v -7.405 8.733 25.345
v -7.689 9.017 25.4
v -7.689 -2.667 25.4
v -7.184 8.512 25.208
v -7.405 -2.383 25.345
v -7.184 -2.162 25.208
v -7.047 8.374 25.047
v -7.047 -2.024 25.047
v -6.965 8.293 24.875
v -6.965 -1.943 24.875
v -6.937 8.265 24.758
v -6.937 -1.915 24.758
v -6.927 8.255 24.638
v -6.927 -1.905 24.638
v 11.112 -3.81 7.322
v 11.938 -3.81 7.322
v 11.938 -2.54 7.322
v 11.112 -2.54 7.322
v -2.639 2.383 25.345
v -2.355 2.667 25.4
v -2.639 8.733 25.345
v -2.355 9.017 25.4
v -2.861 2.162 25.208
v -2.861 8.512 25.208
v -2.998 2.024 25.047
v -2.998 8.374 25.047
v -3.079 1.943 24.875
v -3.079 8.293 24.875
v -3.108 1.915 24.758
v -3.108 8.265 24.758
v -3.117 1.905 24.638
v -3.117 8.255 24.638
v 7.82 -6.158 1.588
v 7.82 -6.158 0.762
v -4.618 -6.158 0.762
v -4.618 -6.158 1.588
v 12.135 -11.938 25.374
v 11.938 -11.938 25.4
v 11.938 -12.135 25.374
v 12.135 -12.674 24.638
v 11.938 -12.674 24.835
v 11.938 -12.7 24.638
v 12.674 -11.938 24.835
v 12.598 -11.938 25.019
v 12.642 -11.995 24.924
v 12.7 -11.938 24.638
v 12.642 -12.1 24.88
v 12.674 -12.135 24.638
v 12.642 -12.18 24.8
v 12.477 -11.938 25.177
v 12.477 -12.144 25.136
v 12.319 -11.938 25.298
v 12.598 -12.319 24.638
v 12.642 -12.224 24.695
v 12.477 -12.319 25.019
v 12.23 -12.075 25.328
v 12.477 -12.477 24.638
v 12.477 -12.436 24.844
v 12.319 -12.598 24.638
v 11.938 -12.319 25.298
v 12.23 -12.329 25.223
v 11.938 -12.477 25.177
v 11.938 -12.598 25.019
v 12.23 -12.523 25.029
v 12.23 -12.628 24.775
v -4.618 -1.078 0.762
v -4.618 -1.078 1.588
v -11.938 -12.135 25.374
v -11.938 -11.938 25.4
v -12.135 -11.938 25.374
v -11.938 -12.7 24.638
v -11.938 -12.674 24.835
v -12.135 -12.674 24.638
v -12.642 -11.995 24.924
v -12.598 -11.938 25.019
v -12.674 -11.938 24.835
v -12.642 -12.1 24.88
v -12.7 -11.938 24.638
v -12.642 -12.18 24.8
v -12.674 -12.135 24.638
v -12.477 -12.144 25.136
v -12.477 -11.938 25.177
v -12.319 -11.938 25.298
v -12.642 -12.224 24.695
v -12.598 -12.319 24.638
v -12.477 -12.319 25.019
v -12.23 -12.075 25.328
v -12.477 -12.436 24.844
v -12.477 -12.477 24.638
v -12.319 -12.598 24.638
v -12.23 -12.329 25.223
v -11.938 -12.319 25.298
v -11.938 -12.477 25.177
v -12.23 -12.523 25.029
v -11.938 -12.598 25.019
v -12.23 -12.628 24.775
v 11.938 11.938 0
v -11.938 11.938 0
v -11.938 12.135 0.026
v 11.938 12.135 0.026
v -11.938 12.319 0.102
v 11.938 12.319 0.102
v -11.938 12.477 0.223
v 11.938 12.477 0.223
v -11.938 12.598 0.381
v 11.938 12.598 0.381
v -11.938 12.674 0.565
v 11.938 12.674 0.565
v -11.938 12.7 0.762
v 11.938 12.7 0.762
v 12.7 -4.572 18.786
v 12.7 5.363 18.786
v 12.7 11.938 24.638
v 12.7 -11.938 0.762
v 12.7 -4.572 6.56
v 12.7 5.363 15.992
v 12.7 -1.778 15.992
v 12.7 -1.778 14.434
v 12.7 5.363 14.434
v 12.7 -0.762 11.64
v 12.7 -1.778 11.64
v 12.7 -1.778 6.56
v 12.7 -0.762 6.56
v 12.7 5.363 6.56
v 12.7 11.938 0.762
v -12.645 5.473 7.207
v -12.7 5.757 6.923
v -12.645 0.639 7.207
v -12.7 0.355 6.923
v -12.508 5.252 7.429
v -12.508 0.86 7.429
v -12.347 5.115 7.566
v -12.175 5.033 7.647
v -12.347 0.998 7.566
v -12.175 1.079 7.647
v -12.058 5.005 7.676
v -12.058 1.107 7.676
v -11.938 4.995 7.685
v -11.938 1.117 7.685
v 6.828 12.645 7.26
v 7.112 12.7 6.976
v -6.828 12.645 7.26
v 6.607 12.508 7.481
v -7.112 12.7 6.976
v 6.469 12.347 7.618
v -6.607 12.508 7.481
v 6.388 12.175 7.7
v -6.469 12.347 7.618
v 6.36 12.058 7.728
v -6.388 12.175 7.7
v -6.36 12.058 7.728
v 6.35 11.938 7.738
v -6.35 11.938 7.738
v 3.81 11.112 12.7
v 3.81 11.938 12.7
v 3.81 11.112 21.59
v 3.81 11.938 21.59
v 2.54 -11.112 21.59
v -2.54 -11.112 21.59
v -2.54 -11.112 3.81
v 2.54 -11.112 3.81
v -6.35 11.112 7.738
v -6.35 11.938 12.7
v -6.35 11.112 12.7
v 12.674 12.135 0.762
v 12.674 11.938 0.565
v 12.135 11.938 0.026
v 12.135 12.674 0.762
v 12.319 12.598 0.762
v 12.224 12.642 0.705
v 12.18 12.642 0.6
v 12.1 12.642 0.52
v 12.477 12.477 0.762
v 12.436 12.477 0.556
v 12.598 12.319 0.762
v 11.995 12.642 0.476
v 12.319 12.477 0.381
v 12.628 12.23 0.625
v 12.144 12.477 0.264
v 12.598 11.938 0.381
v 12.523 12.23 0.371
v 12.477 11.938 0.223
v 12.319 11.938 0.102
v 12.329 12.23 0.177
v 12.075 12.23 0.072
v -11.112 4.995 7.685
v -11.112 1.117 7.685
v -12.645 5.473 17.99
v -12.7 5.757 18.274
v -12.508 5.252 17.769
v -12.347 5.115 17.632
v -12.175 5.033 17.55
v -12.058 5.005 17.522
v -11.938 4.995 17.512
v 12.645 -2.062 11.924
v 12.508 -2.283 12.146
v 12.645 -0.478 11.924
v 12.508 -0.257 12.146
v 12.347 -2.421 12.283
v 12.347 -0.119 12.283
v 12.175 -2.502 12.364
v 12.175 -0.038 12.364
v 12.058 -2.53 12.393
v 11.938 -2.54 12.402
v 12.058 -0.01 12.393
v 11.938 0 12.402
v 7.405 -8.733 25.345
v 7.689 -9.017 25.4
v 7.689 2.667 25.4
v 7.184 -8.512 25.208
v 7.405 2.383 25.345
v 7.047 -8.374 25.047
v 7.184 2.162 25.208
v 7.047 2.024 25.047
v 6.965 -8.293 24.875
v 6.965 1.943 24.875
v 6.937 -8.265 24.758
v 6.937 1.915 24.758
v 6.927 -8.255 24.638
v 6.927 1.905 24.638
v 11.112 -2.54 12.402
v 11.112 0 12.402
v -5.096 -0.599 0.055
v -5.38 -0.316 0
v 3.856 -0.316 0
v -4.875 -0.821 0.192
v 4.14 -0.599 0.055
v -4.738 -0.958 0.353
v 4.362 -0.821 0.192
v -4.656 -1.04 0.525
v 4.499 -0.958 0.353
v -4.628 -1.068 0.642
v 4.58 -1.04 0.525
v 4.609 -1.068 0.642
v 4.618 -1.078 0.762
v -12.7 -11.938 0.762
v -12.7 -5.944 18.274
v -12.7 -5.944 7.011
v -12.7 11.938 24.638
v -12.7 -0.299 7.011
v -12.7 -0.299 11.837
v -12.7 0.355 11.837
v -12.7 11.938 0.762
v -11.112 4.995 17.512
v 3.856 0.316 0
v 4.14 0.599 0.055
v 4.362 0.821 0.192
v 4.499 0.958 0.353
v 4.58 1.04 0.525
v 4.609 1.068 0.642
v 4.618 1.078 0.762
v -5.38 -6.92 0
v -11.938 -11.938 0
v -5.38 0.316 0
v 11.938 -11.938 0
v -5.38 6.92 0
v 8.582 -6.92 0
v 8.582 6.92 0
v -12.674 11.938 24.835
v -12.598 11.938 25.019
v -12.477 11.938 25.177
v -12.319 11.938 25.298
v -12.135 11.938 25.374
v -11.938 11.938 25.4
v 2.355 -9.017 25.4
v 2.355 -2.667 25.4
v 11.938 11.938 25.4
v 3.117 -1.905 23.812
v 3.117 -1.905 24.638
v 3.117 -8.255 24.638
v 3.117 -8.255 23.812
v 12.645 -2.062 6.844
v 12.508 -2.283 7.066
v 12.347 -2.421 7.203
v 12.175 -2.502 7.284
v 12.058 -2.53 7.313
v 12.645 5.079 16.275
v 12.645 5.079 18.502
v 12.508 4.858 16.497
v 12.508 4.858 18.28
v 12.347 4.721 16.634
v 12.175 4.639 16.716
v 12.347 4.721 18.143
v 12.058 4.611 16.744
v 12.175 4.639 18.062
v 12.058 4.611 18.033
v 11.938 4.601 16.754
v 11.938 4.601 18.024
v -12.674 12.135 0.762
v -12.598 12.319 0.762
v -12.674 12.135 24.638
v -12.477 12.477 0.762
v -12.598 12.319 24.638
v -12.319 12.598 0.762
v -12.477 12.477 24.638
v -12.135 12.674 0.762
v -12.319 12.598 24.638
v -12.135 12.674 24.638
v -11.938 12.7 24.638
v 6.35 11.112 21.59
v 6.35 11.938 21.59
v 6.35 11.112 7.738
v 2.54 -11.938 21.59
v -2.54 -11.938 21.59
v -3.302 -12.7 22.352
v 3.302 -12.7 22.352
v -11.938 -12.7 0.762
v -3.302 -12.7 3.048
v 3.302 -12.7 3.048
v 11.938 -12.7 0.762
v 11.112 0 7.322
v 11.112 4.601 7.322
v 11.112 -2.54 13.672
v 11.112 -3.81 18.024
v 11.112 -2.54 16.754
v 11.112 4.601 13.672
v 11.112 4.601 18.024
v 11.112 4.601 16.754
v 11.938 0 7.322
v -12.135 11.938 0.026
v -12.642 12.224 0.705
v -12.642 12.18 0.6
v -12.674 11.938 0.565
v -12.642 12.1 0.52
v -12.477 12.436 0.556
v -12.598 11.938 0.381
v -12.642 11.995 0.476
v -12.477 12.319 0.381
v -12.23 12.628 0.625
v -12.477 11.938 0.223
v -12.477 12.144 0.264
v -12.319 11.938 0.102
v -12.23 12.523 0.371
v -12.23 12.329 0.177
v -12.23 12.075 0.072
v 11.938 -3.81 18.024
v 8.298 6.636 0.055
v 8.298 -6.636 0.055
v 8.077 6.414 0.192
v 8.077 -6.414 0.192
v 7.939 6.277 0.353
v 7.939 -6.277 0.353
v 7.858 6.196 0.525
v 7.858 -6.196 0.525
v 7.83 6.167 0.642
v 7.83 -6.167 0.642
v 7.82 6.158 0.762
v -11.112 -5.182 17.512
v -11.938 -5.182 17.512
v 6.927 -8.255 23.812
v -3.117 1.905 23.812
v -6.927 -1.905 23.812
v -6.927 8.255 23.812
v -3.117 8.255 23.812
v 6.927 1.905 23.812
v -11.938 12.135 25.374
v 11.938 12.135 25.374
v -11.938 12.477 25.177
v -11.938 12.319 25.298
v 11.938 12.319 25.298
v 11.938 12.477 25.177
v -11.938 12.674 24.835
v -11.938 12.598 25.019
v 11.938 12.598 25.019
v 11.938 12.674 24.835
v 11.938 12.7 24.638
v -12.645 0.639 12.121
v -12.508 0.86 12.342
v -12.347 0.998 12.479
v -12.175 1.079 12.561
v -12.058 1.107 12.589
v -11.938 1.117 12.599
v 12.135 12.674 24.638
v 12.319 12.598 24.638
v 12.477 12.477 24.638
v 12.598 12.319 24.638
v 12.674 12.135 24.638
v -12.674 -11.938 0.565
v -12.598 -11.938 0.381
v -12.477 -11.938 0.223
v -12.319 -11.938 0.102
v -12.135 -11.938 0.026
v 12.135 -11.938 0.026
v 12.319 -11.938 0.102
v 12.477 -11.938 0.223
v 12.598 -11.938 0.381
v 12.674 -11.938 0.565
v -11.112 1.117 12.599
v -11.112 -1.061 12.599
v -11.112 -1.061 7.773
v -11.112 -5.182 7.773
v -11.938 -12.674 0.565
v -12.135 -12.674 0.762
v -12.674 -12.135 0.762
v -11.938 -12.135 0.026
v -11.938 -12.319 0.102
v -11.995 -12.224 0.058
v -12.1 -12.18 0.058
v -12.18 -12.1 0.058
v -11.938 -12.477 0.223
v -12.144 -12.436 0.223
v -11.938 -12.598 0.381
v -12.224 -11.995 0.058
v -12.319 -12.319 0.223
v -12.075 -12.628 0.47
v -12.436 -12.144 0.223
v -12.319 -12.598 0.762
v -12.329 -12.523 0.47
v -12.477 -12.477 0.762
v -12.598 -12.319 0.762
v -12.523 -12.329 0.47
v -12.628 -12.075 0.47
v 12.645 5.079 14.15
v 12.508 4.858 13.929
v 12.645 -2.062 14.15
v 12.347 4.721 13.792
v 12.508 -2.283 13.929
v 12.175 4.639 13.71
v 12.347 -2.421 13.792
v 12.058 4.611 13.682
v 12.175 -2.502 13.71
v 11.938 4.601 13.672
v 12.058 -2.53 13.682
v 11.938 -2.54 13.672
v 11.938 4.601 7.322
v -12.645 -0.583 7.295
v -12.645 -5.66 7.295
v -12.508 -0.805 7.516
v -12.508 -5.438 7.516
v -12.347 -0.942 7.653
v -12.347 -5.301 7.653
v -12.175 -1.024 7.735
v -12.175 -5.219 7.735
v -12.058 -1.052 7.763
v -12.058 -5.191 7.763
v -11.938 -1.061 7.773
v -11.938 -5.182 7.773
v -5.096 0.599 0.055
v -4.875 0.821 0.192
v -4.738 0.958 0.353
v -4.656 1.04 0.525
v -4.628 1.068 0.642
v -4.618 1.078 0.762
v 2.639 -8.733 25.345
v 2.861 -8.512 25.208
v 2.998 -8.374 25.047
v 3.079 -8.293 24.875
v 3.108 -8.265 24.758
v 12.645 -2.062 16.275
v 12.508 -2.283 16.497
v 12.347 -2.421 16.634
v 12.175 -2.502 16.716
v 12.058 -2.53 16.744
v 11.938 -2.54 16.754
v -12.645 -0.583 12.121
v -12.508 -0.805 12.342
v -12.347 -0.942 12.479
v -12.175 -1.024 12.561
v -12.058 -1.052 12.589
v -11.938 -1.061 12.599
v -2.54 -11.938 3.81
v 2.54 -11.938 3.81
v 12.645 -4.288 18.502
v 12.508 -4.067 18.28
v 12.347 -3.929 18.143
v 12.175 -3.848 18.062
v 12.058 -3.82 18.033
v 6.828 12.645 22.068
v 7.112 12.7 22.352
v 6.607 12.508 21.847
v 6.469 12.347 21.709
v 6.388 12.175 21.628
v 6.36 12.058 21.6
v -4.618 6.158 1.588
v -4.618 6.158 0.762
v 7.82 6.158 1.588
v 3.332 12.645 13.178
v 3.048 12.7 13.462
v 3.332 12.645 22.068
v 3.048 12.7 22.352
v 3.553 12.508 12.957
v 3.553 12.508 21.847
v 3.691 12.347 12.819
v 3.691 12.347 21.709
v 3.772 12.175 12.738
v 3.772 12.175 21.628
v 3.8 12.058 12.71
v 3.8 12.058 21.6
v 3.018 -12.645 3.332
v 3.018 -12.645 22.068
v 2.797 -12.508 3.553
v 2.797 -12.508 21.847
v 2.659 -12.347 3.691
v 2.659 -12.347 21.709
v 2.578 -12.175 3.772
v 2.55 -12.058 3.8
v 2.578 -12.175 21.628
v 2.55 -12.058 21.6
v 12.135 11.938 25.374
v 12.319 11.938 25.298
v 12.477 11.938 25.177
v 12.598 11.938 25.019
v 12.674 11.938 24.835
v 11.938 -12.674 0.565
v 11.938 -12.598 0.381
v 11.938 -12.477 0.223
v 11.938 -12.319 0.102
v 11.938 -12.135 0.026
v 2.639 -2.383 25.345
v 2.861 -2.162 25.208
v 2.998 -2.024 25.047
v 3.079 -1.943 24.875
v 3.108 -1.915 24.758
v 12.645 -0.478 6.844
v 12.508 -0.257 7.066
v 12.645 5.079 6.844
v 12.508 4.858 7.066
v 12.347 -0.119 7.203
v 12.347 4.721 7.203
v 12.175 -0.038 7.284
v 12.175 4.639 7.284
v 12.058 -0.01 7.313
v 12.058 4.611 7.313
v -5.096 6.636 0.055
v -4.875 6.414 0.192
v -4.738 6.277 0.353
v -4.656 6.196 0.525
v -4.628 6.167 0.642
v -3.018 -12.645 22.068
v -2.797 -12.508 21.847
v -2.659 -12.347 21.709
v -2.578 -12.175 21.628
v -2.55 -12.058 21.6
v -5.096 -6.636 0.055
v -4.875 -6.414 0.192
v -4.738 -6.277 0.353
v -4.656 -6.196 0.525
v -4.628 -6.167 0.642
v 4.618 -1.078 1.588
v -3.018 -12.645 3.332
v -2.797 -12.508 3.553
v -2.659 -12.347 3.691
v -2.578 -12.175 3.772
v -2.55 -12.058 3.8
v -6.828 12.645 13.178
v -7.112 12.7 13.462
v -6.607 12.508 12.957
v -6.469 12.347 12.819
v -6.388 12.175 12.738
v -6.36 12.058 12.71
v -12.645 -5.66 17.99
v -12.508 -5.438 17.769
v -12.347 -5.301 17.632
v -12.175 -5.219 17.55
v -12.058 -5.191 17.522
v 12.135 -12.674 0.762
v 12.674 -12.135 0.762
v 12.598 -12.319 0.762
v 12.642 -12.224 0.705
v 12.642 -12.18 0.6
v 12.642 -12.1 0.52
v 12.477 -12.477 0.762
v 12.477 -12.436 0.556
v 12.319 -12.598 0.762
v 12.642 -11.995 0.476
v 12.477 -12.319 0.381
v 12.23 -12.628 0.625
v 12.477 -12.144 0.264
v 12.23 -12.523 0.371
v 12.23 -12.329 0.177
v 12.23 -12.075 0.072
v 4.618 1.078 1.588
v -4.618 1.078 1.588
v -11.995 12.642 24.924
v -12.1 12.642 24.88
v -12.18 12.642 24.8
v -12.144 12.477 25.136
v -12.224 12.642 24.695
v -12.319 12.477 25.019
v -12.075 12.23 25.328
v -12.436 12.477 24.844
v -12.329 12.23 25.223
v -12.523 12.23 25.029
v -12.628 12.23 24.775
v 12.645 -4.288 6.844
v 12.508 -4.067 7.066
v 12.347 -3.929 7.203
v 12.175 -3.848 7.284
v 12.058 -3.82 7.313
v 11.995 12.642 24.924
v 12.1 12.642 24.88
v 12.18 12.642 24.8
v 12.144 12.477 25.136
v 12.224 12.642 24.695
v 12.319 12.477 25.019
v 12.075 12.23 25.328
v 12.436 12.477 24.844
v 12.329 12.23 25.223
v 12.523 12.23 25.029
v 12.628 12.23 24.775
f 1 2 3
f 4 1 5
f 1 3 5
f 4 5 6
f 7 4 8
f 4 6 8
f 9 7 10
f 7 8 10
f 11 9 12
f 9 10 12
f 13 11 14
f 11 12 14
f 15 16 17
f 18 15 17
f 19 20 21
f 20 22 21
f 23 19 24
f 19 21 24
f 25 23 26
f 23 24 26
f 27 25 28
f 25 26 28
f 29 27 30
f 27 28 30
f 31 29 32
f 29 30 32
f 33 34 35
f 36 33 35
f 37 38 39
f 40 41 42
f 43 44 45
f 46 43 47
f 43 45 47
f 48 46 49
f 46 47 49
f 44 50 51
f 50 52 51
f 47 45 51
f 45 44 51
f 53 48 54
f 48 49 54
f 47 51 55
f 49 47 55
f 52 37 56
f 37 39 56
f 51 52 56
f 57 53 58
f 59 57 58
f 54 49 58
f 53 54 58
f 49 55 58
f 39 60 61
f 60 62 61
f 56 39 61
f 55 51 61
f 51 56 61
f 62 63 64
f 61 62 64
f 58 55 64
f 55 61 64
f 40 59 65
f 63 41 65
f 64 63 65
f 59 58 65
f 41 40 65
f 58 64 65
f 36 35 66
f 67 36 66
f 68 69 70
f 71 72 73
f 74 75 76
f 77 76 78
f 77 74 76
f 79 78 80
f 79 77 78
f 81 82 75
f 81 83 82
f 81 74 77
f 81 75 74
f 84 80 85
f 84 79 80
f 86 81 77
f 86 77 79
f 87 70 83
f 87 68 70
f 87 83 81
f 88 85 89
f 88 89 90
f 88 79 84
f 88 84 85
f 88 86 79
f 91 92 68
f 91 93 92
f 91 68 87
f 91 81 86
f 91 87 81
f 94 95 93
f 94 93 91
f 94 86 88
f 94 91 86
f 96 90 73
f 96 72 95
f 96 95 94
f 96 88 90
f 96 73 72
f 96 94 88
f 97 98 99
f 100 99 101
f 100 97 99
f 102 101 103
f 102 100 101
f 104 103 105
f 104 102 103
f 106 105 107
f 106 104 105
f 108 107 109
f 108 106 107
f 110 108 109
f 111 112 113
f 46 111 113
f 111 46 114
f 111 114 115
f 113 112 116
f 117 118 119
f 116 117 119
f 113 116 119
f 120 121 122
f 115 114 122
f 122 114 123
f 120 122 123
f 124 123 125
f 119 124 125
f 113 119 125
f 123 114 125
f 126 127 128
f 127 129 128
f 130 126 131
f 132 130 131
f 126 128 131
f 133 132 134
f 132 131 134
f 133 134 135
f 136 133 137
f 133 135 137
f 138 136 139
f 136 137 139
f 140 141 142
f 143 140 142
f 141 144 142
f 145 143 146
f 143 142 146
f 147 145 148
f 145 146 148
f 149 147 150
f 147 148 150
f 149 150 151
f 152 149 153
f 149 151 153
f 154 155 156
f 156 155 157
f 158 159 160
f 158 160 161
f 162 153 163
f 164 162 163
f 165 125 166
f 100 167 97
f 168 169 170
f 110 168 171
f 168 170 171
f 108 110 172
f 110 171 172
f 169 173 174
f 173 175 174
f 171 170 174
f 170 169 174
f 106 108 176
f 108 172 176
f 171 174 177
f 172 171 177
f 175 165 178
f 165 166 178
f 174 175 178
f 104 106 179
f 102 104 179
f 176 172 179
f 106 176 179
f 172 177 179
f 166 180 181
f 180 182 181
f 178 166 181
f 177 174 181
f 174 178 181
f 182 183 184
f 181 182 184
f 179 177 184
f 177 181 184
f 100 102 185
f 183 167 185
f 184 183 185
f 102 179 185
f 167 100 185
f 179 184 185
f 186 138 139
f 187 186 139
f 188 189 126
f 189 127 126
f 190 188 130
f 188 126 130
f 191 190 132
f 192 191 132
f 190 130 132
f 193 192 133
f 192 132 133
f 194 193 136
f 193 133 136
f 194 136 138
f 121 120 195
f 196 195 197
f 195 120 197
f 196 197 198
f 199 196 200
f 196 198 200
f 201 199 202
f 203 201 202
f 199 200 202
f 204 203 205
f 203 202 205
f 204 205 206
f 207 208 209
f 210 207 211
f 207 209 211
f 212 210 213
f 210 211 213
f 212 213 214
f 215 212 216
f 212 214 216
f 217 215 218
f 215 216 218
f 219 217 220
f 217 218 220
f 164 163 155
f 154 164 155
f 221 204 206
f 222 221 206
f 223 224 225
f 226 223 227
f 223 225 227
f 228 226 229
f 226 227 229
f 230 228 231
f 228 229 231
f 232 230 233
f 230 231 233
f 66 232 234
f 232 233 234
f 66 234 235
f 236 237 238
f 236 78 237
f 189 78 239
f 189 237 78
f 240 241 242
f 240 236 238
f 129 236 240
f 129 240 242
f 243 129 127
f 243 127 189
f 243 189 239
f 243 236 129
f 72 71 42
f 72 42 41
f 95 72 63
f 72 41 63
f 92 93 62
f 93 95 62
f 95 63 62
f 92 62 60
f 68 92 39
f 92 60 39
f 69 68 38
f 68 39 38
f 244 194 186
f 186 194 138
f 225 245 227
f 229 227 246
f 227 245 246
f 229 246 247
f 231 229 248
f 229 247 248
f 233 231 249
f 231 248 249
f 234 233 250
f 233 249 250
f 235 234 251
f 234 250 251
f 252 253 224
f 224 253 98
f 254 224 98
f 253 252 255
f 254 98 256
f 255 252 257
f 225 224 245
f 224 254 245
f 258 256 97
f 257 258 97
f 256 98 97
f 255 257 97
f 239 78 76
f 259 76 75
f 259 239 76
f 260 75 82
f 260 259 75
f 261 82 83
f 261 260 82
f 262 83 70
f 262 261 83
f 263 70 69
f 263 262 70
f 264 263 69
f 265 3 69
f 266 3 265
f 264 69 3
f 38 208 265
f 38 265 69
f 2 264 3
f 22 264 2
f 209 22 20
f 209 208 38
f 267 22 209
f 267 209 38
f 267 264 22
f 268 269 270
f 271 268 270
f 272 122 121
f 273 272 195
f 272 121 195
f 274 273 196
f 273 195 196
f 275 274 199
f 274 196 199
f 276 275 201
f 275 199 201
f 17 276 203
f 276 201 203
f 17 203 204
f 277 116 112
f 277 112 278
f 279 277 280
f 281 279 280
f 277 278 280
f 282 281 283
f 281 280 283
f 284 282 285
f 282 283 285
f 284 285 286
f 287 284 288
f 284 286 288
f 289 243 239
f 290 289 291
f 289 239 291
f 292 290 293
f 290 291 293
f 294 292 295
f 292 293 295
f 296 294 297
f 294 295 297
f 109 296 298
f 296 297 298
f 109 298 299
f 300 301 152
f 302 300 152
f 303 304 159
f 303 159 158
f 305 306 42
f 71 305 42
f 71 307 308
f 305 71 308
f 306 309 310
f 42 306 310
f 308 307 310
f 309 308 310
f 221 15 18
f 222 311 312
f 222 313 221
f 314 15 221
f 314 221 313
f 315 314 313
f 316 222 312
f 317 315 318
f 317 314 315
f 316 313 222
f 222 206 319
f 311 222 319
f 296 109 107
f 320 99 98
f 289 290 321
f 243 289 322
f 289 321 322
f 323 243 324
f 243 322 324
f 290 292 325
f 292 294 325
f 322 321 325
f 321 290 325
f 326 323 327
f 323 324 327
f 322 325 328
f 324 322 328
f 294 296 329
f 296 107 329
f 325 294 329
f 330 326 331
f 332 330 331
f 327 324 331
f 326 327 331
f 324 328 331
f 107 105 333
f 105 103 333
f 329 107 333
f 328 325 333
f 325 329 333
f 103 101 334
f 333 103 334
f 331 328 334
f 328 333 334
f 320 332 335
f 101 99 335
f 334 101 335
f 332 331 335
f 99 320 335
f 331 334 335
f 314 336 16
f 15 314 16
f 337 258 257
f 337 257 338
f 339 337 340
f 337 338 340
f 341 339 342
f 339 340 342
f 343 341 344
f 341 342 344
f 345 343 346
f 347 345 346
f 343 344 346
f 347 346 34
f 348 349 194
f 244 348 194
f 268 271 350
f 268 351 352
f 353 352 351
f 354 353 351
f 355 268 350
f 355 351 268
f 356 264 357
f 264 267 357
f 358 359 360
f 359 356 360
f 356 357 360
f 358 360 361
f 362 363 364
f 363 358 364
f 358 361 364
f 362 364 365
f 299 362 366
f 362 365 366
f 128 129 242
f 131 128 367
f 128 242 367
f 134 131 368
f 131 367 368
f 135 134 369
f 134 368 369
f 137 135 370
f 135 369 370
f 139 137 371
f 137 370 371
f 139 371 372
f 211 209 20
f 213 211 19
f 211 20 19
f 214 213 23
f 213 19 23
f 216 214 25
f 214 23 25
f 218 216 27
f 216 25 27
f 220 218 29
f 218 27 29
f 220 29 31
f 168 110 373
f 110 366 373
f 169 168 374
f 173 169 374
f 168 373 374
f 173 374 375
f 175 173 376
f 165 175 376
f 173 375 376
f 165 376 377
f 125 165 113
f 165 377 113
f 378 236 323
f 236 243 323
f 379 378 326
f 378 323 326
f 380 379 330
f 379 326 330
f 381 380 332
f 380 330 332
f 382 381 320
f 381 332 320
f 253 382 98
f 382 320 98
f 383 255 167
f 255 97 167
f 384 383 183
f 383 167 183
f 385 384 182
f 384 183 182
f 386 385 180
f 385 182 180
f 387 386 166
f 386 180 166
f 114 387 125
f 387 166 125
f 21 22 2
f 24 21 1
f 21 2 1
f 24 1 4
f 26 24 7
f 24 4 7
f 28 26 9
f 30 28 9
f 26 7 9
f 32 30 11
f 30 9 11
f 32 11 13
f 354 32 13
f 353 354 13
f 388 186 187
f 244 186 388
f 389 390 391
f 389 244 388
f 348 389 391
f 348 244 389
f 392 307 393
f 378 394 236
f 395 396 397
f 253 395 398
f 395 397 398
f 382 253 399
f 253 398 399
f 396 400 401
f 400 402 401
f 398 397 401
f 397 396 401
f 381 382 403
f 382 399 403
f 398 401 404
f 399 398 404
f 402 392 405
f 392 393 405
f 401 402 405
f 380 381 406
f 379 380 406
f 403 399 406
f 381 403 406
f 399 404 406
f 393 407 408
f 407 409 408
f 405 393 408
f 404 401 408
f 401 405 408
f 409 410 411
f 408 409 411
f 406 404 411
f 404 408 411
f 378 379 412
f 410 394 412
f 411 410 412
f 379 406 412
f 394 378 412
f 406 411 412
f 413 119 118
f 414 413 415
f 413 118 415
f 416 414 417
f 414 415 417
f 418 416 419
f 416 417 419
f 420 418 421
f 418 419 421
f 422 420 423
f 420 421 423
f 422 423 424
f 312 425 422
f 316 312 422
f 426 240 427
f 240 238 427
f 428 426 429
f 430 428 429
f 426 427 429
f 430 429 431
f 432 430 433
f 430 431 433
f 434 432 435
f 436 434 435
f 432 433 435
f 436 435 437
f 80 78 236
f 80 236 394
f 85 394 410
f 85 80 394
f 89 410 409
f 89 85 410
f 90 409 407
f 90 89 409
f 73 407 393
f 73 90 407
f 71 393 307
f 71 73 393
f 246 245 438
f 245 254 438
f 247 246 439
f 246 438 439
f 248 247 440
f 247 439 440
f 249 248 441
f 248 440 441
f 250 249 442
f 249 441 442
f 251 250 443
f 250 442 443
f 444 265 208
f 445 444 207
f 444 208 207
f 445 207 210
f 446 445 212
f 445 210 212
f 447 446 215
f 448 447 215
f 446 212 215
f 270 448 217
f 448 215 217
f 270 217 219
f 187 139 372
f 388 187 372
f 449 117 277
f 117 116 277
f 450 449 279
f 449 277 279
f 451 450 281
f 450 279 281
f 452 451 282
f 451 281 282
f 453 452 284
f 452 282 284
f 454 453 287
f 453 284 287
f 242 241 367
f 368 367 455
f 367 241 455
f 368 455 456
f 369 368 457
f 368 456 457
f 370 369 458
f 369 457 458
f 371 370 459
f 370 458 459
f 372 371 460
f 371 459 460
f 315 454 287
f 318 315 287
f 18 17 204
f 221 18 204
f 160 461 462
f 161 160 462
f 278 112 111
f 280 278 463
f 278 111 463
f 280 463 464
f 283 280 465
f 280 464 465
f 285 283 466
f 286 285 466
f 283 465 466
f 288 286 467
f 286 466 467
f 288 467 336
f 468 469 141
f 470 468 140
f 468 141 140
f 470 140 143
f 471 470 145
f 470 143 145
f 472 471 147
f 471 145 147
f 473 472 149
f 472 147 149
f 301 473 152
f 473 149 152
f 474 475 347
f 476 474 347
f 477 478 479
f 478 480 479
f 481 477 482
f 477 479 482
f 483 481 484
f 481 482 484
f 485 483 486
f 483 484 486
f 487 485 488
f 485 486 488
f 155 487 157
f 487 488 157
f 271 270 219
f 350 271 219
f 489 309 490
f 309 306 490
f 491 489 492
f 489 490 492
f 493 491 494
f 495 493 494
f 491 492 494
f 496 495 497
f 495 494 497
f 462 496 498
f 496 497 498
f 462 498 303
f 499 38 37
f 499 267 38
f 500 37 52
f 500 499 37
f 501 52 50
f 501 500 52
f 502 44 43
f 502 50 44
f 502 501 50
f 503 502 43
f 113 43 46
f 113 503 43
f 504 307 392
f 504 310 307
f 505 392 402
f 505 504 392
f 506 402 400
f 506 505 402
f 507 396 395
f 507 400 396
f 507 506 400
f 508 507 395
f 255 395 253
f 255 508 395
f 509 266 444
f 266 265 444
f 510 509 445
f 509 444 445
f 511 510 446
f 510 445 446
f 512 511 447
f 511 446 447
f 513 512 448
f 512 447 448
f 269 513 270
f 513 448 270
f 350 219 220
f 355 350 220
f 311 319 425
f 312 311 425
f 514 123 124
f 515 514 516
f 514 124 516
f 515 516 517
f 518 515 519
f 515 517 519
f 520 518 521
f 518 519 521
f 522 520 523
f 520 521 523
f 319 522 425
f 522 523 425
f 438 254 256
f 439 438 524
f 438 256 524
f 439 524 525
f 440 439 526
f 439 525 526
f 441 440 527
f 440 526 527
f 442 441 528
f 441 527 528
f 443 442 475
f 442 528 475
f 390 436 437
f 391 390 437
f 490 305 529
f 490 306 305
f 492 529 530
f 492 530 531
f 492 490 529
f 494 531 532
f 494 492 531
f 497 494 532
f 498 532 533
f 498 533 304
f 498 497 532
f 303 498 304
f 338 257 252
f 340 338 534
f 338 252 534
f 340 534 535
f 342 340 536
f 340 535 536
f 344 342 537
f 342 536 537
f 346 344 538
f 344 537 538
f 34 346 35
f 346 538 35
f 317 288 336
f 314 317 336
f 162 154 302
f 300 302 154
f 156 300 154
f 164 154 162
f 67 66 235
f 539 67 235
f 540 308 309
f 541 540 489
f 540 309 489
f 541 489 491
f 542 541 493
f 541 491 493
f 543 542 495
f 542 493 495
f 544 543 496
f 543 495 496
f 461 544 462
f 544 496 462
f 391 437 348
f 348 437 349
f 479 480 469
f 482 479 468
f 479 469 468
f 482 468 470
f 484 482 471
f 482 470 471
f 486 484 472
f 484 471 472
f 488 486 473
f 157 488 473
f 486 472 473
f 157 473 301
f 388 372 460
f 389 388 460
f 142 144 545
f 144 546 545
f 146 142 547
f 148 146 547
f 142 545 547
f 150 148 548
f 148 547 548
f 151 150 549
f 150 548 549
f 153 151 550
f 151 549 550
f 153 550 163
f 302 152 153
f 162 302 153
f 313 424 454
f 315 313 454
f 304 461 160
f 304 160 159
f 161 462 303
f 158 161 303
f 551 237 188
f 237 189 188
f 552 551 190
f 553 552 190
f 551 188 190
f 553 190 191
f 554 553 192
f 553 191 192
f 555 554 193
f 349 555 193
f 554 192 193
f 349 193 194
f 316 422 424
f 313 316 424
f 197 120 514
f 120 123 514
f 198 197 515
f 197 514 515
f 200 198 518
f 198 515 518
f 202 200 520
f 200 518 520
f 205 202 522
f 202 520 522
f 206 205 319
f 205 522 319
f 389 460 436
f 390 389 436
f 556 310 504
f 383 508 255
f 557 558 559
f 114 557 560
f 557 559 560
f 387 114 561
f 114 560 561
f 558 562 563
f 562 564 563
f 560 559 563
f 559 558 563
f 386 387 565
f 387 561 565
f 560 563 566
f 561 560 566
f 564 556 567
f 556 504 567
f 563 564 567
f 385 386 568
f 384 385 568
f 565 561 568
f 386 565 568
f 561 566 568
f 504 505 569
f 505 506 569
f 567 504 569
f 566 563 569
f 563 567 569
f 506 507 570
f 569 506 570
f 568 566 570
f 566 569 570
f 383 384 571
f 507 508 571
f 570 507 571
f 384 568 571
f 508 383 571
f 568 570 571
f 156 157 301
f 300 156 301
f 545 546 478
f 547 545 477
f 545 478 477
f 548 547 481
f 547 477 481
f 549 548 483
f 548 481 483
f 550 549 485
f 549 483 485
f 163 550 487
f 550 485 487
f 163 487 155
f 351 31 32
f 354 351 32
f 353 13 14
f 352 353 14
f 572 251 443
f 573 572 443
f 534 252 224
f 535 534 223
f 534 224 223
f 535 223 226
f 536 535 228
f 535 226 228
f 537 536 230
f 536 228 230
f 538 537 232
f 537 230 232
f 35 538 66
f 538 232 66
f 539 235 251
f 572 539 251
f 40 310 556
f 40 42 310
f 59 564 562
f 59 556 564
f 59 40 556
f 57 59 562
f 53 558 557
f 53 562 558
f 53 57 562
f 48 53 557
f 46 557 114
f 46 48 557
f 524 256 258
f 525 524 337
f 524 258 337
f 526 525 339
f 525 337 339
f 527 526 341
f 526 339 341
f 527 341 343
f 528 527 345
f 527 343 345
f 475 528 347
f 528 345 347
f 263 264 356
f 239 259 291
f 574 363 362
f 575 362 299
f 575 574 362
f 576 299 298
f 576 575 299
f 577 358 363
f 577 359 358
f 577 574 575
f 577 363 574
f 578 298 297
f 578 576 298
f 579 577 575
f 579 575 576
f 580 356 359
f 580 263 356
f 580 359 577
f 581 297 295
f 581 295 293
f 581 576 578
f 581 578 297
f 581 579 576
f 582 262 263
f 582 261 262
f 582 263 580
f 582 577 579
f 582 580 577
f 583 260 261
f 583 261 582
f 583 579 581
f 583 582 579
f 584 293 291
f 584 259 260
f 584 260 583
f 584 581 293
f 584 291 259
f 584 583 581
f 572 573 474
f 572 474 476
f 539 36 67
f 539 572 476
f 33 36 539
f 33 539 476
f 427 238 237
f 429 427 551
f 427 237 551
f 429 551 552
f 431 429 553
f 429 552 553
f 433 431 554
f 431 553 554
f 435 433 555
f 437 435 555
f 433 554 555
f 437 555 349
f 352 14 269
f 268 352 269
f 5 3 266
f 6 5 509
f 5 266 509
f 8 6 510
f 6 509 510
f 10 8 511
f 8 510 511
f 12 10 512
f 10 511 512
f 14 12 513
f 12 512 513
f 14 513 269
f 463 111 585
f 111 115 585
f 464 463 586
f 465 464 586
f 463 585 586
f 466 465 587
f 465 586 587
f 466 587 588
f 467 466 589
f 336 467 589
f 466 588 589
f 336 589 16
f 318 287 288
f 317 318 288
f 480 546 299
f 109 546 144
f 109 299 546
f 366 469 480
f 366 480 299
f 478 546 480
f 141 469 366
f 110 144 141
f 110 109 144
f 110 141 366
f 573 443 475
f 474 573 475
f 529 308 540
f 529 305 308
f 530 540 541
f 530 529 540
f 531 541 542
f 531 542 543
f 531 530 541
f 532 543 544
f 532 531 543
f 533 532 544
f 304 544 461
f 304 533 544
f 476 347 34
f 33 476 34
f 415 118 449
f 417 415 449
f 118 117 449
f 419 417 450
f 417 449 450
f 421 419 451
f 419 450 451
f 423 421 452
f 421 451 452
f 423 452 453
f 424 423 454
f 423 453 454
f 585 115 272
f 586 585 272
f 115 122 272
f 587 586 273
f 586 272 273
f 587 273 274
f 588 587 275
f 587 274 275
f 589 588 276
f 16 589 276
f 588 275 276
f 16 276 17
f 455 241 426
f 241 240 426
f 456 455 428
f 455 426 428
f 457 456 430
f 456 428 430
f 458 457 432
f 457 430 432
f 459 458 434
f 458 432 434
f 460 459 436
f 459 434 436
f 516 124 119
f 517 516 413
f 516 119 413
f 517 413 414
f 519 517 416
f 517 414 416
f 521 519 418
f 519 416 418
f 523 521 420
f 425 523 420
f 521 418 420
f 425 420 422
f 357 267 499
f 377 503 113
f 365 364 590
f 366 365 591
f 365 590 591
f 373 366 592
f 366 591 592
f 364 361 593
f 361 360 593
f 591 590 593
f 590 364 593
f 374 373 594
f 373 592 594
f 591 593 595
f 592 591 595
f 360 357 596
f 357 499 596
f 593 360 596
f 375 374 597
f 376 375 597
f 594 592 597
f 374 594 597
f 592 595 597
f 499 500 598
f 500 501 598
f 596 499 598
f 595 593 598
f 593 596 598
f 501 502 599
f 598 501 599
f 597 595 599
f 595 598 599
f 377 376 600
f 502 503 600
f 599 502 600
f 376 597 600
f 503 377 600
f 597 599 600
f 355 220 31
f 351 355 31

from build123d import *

# Parameters (mm, degrees)
F0_W      = 25.4
F0_H      = 25.4
F1_DEPTH  = 25.4
F8_DEPTH  = 1.5875
F2_W      = 5.08
F2_H      = 17.78
F9_DEPTH  = 1.5875
F10_DEPTH = 1.5875
F11_DEPTH = 1.5875
F12_DEPTH = 1.5875
F13_DEPTH = 1.5875
F14_R     = 0.762


with BuildPart() as f1:
    # F0 (on Top) → F1 (new body)
    with BuildSketch(Plane.XY):
        Rectangle(F0_W, F0_H)
    extrude(amount=F1_DEPTH)

    # F7 (on face) → F8 (cut)
    with BuildSketch(Plane(origin=(-12.7, 0, 0), x_dir=(0, -1, 0), z_dir=(-1, 0, 0))):
        Polygon((-4.9953212532, 7.685226252), (-1.1170259365, 7.685226252), (-1.1170259365, 12.5987064093), (1.0614689121, 12.5987064093), (1.0614689121, 7.7727064093), (5.1815596911, 7.7727064093), (5.1815596911, 17.5121865667), (1.0614689121, 17.5121865667), (-1.1170259365, 17.5121865667), (-4.9953212532, 17.5121865667), align=None)
    extrude(amount=-F8_DEPTH, mode=Mode.SUBTRACT)

    # F2 (on face) → F9 (cut)
    with BuildSketch(Plane.XZ.offset(12.7)):
        with Locations((0, 12.7)):
            Rectangle(F2_W, F2_H)
    extrude(amount=-F9_DEPTH, mode=Mode.SUBTRACT)

    # F6 (on face) → F10 (cut)
    with BuildSketch(Plane.YZ.offset(12.7)):
        Polygon((0, 7.3222619789), (4.6011506993, 7.3222619789), (4.6011506993, 12.4022619789), (4.6011506993, 13.6722619789), (-2.54, 13.6722619789), (-2.54, 16.7535761464), (4.6011506993, 16.7535761464), (4.6011506993, 18.0235761464), (-2.54, 18.0235761464), (-3.81, 18.0235761464), (-3.81, 7.3222619789), (-2.54, 7.3222619789), (-2.54, 12.4022619789), (0, 12.4022619789), align=None)
    extrude(amount=-F10_DEPTH, mode=Mode.SUBTRACT)

    # F4 (on face) → F11 (cut)
    with BuildSketch(Plane(origin=(0, 12.7, 0), x_dir=(-1, 0, 0), z_dir=(0, 1, 0))):
        Polygon((6.35, 7.737770211), (6.35, 12.7), (-3.81, 12.7), (-3.81, 21.59), (-6.35, 21.59), (-6.35, 12.7), (-6.35, 7.737770211), align=None)
    extrude(amount=-F11_DEPTH, mode=Mode.SUBTRACT)

    # F3 (on face) → F12 (cut)
    with BuildSketch(Plane.XY.offset(25.4)):
        Polygon((-6.9272688269, 1.905), (-6.9272688269, -1.905), (3.1172688269, -1.905), (3.1172688269, -8.255), (6.9272688269, -8.255), (6.9272688269, -1.905), (6.9272688269, 1.905), (-3.1172688269, 1.905), (-3.1172688269, 8.255), (-6.9272688269, 8.255), align=None)
    extrude(amount=-F12_DEPTH, mode=Mode.SUBTRACT)

    # F5 (on face) → F13 (cut)
    with BuildSketch(Plane(origin=(0, 0, 0), x_dir=(1, 0, 0), z_dir=(0, 0, -1))):
        Polygon((-4.6181826849, 6.1575769132), (-4.6181826849, 1.0775769132), (4.6181826849, 1.0775769132), (4.6181826849, -1.0775769132), (-4.6181826849, -1.0775769132), (-4.6181826849, -6.1575769132), (4.6181826849, -6.1575769132), (7.8201234426, -6.1575769132), (7.8201234426, 6.1575769132), (4.6181826849, 6.1575769132), align=None)
    extrude(amount=-F13_DEPTH, mode=Mode.SUBTRACT)

    # F14
    f14_edges = [f1.edges().sort_by_distance(p)[0] for p in [
        (0, -12.7, 25.4),
        (-12.7, 0, 25.4),
        (12.7, 0, 25.4),
        (0, 12.7, 25.4),
        (-1.905, -1.905, 25.4),
        (3.117269, -5.08, 25.4),
        (5.022269, -8.255, 25.4),
        (6.927269, -3.175, 25.4),
        (1.905, 1.905, 25.4),
        (-3.117269, 5.08, 25.4),
        (-5.022269, 8.255, 25.4),
        (-6.927269, 3.175, 25.4),
        (-12.7, -12.7, 12.7),
        (0, -12.7, 0),
        (12.7, -12.7, 12.7),
        (-2.54, -12.7, 12.7),
        (0, -12.7, 21.59),
        (2.54, -12.7, 12.7),
        (0, -12.7, 3.81),
        (12.7, 0, 0),
        (12.7, 12.7, 12.7),
        (12.7, 0, 9.862262),
        (12.7, -1.27, 12.402262),
        (12.7, -2.54, 9.862262),
        (12.7, -3.175, 7.322262),
        (12.7, -3.81, 12.672919),
        (12.7, 0.395575, 18.023576),
        (12.7, 4.601151, 17.388576),
        (12.7, 1.030575, 16.753576),
        (12.7, -2.54, 15.212919),
        (12.7, 1.030575, 13.672262),
        (12.7, 4.601151, 10.497262),
        (12.7, 2.300575, 7.322262),
        (0, 12.7, 0),
        (-12.7, 12.7, 12.7),
        (0, 12.7, 7.73777),
        (6.35, 12.7, 14.663885),
        (5.08, 12.7, 21.59),
        (3.81, 12.7, 17.145),
        (-1.27, 12.7, 12.7),
        (-6.35, 12.7, 10.218885),
        (-12.7, 0, 0),
        (-12.7, -0.093119, 17.512187),
        (-12.7, -5.18156, 12.642446),
        (-12.7, -3.121514, 7.772706),
        (-12.7, -1.061469, 10.185706),
        (-12.7, 0.027779, 12.598706),
        (-12.7, 1.117026, 10.141966),
        (-12.7, 3.056174, 7.685226),
        (-12.7, 4.995321, 12.598706),
        (1.60097, 6.157577, 0),
        (-4.618183, 3.617577, 0),
        (0, 1.077577, 0),
        (4.618183, 0, 0),
        (0, -1.077577, 0),
        (-4.618183, -3.617577, 0),
        (1.60097, -6.157577, 0),
        (7.820123, 0, 0),
    ]]
    fillet(f14_edges, radius=F14_R)


solid = f1.part
